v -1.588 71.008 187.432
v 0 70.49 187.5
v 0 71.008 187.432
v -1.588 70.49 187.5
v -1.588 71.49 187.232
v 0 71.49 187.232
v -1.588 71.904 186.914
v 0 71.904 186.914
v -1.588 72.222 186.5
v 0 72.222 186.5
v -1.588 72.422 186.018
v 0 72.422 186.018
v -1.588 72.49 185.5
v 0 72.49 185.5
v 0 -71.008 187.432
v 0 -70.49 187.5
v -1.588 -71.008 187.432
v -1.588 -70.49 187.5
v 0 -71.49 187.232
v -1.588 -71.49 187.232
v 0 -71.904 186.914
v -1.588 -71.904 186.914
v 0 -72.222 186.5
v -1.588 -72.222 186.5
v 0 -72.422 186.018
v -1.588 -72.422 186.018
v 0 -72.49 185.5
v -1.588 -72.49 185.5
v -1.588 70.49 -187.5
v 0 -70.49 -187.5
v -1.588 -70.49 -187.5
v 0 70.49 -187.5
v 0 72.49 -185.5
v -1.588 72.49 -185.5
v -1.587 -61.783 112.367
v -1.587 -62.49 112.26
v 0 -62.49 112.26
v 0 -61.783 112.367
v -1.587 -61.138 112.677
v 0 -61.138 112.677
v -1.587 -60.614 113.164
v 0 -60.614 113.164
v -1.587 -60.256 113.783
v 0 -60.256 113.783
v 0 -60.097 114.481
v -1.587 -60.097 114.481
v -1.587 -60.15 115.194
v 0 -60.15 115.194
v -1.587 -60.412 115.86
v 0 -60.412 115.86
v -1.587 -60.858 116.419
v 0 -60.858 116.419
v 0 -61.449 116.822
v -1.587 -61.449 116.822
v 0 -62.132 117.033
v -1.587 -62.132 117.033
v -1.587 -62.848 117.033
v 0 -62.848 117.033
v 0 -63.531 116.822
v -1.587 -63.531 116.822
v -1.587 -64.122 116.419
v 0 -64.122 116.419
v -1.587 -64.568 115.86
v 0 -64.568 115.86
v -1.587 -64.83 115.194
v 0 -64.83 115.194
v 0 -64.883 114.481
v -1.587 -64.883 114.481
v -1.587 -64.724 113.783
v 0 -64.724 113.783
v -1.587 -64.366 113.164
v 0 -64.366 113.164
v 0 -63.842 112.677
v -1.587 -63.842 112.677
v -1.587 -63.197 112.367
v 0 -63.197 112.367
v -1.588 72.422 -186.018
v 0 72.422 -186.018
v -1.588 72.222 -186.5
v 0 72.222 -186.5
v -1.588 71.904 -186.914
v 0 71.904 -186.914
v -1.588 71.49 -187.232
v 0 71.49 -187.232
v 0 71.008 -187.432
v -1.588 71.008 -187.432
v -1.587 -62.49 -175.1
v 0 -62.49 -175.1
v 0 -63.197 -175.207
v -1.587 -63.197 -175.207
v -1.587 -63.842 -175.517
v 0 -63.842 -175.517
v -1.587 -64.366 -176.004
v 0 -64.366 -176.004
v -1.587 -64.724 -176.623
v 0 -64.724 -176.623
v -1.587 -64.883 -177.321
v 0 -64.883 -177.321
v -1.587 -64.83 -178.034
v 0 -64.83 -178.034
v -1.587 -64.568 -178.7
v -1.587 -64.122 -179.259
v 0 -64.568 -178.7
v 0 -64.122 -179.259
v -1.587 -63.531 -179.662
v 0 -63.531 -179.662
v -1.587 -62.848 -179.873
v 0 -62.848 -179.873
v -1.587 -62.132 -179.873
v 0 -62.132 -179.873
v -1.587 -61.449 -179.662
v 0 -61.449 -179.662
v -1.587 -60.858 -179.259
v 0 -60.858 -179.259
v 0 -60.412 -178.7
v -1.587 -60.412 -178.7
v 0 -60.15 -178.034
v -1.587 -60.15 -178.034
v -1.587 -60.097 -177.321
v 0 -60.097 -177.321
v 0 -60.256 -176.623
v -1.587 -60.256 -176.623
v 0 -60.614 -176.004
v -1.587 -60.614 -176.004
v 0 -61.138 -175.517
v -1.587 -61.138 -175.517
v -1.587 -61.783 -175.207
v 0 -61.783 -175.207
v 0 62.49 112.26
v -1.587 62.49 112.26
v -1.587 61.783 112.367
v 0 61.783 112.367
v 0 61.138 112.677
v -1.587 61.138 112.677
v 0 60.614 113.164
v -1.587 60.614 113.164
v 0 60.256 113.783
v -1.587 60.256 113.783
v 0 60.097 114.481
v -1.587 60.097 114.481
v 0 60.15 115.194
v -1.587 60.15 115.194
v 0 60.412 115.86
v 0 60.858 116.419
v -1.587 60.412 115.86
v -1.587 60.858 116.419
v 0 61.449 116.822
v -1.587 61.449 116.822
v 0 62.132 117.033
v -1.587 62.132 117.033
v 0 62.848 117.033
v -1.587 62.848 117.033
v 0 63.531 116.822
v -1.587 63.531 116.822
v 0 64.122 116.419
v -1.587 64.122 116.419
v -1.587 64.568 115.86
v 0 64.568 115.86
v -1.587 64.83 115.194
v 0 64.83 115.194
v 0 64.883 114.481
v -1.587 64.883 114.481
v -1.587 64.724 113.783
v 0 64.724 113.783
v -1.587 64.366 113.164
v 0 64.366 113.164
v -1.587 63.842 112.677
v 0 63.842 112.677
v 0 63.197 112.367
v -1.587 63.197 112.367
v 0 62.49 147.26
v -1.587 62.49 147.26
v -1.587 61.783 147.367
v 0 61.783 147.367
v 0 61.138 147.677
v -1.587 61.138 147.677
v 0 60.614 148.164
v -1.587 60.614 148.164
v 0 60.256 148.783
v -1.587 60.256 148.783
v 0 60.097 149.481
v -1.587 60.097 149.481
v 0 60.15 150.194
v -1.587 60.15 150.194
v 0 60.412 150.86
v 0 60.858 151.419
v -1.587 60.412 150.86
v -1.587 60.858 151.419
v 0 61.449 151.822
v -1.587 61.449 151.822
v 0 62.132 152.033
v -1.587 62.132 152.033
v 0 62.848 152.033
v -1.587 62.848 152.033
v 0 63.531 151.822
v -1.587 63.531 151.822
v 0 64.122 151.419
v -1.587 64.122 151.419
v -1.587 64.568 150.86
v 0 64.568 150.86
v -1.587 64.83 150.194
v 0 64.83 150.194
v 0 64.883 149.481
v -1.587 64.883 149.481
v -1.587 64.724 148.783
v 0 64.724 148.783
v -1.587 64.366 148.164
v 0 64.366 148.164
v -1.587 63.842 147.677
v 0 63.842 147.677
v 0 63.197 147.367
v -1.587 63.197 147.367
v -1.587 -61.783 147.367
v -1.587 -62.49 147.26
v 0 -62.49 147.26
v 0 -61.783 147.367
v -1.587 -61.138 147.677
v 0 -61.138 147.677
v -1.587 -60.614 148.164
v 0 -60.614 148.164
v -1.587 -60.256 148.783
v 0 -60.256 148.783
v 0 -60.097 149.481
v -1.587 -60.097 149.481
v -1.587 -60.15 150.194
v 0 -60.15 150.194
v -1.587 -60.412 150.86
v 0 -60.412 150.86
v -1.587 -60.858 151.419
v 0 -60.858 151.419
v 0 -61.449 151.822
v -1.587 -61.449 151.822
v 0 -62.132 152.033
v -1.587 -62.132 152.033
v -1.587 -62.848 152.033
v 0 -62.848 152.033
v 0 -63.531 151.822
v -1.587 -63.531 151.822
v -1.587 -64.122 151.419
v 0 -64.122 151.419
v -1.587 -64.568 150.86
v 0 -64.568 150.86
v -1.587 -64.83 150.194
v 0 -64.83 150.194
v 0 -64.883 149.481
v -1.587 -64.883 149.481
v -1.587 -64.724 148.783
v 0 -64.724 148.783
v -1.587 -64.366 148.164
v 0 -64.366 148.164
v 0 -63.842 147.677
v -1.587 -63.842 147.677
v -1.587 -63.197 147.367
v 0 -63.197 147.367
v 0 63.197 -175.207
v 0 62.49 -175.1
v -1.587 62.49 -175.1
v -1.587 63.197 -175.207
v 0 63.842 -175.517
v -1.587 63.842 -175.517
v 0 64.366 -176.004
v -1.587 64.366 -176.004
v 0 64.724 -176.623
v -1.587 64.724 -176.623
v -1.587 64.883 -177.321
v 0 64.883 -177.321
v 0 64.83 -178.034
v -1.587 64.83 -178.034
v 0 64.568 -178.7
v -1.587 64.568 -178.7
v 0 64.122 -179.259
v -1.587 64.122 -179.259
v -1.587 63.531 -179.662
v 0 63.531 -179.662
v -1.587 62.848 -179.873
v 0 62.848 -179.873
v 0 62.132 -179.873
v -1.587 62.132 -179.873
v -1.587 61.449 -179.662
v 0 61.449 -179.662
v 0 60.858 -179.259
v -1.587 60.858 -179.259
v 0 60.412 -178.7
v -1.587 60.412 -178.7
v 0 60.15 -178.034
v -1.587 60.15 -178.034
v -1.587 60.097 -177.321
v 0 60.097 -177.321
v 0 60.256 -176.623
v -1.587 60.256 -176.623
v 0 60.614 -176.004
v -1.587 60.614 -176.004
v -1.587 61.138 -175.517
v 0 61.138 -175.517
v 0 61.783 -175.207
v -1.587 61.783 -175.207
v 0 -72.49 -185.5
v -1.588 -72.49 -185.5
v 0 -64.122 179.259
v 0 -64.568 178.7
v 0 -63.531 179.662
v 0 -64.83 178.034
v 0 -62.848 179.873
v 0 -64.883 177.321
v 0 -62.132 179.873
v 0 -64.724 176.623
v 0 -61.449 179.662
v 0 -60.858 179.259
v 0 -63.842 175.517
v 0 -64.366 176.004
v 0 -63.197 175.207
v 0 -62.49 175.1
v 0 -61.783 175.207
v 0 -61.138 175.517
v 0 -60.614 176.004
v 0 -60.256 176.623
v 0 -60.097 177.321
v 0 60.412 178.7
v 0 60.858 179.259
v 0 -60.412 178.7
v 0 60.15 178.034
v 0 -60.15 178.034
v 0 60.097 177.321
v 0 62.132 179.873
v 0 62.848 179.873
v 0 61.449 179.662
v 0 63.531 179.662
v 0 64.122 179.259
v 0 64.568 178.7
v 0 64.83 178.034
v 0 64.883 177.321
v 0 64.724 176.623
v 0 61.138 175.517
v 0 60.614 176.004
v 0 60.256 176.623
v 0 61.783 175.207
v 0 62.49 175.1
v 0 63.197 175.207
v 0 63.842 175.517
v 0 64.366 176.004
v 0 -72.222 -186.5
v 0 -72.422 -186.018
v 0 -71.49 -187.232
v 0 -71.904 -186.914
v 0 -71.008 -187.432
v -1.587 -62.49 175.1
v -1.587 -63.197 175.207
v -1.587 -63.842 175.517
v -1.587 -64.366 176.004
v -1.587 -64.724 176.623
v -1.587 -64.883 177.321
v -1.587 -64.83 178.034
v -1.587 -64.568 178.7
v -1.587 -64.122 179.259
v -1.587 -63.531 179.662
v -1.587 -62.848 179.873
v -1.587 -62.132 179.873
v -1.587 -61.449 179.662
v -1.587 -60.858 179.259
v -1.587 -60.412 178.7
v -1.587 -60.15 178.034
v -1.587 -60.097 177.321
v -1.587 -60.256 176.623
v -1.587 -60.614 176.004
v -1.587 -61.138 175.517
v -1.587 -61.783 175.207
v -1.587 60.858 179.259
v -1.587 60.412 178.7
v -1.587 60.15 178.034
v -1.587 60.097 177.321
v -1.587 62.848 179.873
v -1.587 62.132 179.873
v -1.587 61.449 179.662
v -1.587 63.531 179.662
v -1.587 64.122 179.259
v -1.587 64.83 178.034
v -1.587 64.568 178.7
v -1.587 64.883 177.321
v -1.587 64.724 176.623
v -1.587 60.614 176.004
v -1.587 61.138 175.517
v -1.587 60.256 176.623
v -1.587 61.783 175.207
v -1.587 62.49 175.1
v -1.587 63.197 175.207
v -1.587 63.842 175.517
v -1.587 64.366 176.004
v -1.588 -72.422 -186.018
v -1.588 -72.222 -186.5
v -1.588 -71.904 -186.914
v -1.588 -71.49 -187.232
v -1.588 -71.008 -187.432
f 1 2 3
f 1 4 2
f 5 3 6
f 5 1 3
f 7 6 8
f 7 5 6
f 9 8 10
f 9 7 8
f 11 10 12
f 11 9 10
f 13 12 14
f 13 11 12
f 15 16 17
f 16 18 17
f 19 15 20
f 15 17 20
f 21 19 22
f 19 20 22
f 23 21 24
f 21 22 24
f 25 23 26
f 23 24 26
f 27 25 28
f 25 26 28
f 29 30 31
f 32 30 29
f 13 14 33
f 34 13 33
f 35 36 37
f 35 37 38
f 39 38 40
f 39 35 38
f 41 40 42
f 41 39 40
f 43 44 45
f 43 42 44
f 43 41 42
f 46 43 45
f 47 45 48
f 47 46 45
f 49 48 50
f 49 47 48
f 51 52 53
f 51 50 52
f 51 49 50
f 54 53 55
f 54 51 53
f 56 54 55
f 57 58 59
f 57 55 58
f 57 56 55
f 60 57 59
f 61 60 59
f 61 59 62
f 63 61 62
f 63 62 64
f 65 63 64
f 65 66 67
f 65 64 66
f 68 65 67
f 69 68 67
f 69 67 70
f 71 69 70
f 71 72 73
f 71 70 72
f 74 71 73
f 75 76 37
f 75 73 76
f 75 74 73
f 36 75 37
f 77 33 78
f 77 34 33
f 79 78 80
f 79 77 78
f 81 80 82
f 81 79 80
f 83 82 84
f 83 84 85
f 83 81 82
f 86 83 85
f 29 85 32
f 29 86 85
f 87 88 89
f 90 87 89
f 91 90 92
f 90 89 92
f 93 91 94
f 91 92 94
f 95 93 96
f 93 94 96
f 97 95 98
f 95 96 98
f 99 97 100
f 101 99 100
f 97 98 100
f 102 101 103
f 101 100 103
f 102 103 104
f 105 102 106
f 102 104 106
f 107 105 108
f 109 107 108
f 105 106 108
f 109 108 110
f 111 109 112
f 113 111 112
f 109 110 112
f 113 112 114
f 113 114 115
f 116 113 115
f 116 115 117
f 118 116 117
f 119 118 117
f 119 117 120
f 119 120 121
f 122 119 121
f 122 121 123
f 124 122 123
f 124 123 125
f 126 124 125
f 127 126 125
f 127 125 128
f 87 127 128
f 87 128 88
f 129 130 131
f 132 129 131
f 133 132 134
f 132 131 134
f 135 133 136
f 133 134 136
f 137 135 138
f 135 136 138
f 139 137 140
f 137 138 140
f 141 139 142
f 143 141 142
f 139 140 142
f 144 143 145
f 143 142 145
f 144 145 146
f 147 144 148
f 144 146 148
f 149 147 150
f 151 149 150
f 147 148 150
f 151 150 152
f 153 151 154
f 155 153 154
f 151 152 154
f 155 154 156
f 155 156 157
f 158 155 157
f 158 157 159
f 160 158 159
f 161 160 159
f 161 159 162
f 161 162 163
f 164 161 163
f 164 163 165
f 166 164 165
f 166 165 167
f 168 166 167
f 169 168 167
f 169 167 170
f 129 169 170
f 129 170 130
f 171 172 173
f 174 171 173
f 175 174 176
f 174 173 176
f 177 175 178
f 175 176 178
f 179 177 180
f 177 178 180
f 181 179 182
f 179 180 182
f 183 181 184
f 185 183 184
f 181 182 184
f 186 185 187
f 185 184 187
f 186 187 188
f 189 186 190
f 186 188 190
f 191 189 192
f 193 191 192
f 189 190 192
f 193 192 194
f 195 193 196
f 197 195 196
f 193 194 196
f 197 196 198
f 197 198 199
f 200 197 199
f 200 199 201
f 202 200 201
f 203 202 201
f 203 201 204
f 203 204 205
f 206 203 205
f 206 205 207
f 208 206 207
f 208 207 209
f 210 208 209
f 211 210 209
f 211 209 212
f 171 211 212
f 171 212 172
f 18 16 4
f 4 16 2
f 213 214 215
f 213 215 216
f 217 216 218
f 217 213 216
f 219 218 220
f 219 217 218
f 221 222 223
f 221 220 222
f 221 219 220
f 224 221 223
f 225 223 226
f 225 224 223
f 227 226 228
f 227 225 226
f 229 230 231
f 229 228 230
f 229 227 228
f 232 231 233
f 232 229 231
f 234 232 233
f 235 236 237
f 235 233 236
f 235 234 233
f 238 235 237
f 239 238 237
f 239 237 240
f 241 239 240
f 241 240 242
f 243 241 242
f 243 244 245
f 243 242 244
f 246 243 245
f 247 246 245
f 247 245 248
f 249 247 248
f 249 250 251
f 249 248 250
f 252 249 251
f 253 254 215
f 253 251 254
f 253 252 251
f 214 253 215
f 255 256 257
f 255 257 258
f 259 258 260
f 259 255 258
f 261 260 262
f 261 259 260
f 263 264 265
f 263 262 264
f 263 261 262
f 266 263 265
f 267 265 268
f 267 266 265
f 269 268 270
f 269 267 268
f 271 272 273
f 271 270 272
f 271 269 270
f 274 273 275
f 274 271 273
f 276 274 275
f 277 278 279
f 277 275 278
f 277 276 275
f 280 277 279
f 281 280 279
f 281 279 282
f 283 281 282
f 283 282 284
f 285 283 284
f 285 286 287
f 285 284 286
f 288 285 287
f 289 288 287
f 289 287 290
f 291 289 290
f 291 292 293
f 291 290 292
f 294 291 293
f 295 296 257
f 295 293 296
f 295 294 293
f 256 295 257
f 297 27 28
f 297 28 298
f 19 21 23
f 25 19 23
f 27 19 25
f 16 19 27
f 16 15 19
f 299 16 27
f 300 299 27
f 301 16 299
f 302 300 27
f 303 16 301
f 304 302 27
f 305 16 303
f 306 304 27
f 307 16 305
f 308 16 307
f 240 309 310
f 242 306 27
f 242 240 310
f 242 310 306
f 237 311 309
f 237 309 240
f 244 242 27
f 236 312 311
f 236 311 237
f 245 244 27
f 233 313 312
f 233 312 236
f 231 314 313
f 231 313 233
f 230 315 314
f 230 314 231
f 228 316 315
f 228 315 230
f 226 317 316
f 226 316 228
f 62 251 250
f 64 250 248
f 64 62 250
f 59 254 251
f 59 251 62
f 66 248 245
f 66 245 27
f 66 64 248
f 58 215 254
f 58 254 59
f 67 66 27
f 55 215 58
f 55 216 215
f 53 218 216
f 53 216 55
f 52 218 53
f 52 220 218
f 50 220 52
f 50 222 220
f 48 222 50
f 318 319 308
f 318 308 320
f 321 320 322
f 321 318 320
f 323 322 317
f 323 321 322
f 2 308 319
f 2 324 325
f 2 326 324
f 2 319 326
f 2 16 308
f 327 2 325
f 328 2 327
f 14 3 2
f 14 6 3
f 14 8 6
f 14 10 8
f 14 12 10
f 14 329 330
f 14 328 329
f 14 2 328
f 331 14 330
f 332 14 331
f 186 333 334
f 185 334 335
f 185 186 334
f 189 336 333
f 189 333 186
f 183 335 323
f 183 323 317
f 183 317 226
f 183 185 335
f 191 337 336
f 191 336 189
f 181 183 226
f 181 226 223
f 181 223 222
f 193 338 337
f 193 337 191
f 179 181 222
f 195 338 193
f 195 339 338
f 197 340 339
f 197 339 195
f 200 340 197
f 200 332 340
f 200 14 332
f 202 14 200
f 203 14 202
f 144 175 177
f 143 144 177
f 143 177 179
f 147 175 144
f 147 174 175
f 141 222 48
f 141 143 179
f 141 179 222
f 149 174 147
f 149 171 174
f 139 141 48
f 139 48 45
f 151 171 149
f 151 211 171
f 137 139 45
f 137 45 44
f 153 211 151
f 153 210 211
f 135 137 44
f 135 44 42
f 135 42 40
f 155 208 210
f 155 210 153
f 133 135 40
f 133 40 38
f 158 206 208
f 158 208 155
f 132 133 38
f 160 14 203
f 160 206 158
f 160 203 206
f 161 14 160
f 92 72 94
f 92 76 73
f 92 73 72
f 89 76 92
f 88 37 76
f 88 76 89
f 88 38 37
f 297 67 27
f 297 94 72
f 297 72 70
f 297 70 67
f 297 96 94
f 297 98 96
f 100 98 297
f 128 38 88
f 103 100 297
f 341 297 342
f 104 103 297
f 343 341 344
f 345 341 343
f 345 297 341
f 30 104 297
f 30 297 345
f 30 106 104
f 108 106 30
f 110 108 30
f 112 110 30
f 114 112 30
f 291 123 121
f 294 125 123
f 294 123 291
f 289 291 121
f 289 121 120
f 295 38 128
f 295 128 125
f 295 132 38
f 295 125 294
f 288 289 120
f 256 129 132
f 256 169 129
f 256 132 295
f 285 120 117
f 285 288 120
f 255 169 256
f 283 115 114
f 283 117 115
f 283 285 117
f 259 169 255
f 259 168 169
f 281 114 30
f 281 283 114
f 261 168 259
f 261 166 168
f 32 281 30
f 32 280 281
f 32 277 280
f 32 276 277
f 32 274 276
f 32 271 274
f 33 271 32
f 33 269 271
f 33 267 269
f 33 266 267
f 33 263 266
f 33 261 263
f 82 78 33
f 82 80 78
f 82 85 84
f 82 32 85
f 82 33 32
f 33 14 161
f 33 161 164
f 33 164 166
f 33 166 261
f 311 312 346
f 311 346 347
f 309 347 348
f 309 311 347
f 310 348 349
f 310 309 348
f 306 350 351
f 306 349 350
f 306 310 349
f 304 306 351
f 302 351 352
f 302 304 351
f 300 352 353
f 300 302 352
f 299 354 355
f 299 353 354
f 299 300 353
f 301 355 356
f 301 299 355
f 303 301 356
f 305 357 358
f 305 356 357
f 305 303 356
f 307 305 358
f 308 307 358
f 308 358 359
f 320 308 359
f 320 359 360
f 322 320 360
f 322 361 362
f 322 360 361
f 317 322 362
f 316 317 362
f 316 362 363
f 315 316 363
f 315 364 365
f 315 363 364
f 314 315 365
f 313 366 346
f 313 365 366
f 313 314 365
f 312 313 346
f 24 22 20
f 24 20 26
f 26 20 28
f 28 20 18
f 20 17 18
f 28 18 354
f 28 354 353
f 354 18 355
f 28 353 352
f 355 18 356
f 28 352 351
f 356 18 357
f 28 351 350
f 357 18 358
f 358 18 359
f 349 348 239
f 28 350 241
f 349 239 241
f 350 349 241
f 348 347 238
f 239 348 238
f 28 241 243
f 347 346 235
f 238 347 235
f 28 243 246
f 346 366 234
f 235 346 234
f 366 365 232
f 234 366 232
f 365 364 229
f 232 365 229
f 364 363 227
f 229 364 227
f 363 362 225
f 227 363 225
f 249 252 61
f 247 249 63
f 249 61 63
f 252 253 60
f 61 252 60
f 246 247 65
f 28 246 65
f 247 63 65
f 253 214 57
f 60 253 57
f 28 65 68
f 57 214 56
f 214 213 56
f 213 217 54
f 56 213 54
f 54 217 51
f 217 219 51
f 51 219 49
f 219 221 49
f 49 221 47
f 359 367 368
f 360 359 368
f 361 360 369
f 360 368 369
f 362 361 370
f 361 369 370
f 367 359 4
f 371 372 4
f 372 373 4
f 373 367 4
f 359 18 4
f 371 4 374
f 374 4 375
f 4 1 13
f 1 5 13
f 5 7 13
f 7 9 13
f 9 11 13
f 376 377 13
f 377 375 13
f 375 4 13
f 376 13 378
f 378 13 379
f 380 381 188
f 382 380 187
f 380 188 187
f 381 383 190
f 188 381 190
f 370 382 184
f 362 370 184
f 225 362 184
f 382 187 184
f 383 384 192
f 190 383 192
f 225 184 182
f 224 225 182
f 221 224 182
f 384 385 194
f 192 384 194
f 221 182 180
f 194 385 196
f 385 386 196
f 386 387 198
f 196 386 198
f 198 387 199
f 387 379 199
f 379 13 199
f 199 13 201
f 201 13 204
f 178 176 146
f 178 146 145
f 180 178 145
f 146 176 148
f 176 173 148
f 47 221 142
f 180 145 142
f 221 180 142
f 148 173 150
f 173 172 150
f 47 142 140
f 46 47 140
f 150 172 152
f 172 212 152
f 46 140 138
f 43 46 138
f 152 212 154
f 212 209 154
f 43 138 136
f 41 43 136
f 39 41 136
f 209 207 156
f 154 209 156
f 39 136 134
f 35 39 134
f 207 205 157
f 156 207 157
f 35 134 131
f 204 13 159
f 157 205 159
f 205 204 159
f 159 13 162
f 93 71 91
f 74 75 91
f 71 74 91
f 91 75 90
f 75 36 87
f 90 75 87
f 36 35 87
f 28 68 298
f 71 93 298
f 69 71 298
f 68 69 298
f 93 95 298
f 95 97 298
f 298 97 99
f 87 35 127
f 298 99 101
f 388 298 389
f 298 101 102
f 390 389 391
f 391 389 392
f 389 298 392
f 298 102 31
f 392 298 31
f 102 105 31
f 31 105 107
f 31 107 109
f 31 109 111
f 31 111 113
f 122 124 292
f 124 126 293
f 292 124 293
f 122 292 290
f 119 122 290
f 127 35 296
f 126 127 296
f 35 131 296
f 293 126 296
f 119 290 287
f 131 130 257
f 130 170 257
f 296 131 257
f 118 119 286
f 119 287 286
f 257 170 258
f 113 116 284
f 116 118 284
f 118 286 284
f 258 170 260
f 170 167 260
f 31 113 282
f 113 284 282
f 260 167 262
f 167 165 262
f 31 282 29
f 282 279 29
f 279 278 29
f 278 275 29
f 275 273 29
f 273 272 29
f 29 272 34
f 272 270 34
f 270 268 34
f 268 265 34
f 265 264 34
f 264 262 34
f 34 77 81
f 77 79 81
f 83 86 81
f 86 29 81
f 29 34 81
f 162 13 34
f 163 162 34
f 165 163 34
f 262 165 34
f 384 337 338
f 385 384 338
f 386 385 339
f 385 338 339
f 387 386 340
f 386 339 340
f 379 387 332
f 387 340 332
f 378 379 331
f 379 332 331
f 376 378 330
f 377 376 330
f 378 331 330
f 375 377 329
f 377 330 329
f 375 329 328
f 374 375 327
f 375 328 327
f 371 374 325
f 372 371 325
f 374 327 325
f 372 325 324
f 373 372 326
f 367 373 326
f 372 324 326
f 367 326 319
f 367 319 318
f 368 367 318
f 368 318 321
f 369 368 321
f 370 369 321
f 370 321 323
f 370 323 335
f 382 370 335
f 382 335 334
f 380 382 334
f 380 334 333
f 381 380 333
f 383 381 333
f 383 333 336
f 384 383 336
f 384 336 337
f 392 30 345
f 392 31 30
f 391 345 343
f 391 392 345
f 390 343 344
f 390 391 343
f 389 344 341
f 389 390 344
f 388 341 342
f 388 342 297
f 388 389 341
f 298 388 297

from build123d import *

# Parameters (mm, degrees)
SKETCH1_W            = 375
SKETCH1_H            = 144.98
BASE_FLANGE1_DEPTH   = 1.5875
M4_CLEARANCE_HOLE1_D = 4.8
MIRROR2_COPY_1_D     = 4.8
M4_CLEARANCE_HOLE2_D = 4.8
FILLET1_R            = 2
FILLET2_R            = 2
FILLET3_R            = 2
FILLET4_R            = 2


# Sheet-metal steps are written as plain solids
with BuildPart() as part:
    # Sketch1 → Base-Flange1 (new body)
    with BuildSketch(Plane(origin=(0, 0, 0), x_dir=(0, 0, -1), z_dir=(1, 0, 0))):
        Rectangle(SKETCH1_W, SKETCH1_H)
    extrude(amount=-BASE_FLANGE1_DEPTH)

    # M4 Clearance Hole1 (through all)
    with Locations(Plane.ZY.offset(1.5875)):
        with Locations((177.5, 62.49)):
            m4_clearance_hole1 = Hole(M4_CLEARANCE_HOLE1_D / 2)

    # Mirror1: M4 Clearance Hole1 across plane
    add(m4_clearance_hole1.mirror(Plane.XY), mode=Mode.SUBTRACT)

    # Mirror2: M4 Clearance Hole1 across plane
    add(m4_clearance_hole1.mirror(Plane.ZX), mode=Mode.SUBTRACT)

    # Mirror2 copy 1 (through all)
    with Locations(Plane(origin=(-1.5875, 0, 0), x_dir=(0, 0, -1), z_dir=(-1, 0, 0))):
        with Locations((177.5, 62.49)):
            Hole(MIRROR2_COPY_1_D / 2)

    # M4 Clearance Hole2 (through all)
    with Locations(Plane(origin=(0, 62.49, 149.66), x_dir=(0, 0, 1), z_dir=(1, 0, 0))):
        with Locations((0, 0), (-35, 0)):
            m4_clearance_hole2 = Hole(M4_CLEARANCE_HOLE2_D / 2)

    # Mirror3: M4 Clearance Hole2 across plane
    add(m4_clearance_hole2.mirror(Plane.ZX), mode=Mode.SUBTRACT)

    # Fillet1
    fillet1_edges = [part.edges().sort_by_distance(p)[0] for p in [
        (-0.79375, 72.49, 187.5),
    ]]
    fillet(fillet1_edges, radius=FILLET1_R)

    # Fillet2
    fillet2_edges = [part.edges().sort_by_distance(p)[0] for p in [
        (-0.79375, -72.49, 187.5),
    ]]
    fillet(fillet2_edges, radius=FILLET2_R)

    # Fillet3
    fillet3_edges = [part.edges().sort_by_distance(p)[0] for p in [
        (-0.79375, 72.49, -187.5),
    ]]
    fillet(fillet3_edges, radius=FILLET3_R)

    # Fillet4
    fillet4_edges = [part.edges().sort_by_distance(p)[0] for p in [
        (-0.79375, -72.49, -187.5),
    ]]
    fillet(fillet4_edges, radius=FILLET4_R)


solid = part.part
